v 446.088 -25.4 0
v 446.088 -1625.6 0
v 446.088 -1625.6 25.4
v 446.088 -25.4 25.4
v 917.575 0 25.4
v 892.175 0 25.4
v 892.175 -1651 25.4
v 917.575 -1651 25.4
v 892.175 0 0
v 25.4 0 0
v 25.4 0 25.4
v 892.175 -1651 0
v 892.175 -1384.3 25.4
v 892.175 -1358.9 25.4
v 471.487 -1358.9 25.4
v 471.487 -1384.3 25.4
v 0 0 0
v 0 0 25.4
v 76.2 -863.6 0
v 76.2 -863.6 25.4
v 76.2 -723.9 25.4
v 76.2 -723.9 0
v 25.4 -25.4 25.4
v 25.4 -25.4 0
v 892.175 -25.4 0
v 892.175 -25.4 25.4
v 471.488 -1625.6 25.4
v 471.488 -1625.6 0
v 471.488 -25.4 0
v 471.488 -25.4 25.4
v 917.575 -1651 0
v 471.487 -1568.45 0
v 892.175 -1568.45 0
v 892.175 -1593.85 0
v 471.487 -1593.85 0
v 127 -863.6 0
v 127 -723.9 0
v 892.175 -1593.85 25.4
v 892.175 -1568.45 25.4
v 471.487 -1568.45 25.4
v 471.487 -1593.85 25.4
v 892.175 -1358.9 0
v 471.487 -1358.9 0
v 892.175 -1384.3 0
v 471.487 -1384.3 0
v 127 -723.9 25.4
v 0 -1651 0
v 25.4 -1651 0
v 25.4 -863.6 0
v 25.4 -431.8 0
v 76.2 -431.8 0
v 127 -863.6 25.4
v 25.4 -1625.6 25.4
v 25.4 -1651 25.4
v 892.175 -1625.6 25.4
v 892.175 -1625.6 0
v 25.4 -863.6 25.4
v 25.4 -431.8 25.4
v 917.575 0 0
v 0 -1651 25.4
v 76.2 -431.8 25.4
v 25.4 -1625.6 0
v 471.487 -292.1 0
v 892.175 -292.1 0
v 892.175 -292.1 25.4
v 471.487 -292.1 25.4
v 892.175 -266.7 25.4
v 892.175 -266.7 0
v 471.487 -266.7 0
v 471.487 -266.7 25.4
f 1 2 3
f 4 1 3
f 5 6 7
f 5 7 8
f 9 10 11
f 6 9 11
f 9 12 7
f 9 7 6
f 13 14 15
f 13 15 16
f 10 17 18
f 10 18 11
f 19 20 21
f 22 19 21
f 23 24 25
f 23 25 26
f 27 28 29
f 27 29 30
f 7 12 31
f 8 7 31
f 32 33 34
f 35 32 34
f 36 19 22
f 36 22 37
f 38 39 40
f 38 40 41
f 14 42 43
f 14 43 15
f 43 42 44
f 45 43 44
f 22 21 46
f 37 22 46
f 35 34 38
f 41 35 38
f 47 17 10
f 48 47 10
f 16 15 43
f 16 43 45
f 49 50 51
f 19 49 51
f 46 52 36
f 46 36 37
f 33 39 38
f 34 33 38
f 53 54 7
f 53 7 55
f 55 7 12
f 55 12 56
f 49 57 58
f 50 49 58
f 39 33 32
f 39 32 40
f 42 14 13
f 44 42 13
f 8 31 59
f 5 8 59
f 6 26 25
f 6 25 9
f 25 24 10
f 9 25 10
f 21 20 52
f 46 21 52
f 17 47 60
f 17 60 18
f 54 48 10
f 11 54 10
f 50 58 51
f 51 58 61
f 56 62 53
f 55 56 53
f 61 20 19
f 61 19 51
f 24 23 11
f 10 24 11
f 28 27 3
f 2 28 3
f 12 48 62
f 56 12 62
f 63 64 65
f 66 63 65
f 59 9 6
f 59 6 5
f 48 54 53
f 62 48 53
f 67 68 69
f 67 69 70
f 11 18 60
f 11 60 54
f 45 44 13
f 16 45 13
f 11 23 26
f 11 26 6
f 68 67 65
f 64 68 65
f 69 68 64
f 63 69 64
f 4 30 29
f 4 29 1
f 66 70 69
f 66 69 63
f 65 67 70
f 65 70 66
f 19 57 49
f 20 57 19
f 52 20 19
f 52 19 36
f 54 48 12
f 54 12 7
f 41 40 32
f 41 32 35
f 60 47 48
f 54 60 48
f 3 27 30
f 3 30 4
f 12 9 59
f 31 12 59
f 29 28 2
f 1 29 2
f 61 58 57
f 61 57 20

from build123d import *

# Parameters (mm, degrees)
F0_W      = 25.4
F0_H      = 1651
F1_DEPTH  = 25.4
F2_W      = 25.4
F2_H      = 25.4
F3_DEPTH  = 866.775
F4_W      = 25.4
F4_H      = 25.4
F5_DEPTH  = 1600.2
F6_W      = 25.4
F6_H      = 25.4
F7_DEPTH  = 420.6875
F8_W      = 50.8
F8_H      = 431.8
F9_DEPTH  = 25.4
F10_W     = 50.8
F10_H     = 139.7
F11_DEPTH = 25.4


with BuildPart() as f1:
    # F0 (on Top) → F1 (new body)
    with BuildSketch(Plane.XY):
        with Locations((12.7, -825.5)):
            Rectangle(F0_W, F0_H)
        with Locations((904.875, -825.5)):
            Rectangle(F0_W, F0_H)
    extrude(amount=F1_DEPTH)


with BuildPart() as f3:
    # F2 (on face) → F3 (new body, through all)
    with BuildSketch(Plane.YZ.offset(25.4)):
        with Locations((-12.7, 12.7)):
            Rectangle(F2_W, F2_H)
        with Locations((-1638.3, 12.7)):
            Rectangle(F2_W, F2_H)
    extrude(amount=F3_DEPTH)


with BuildPart() as f5:
    # F4 (on face) → F5 (new body, through all)
    with BuildSketch(Plane(origin=(0, -1625.6, 0), x_dir=(-1, 0, 0), z_dir=(0, 1, 0))):
        with Locations((-458.7875, 12.7)):
            Rectangle(F4_W, F4_H)
    extrude(amount=F5_DEPTH)


with BuildPart() as f7:
    # F6 (on face) → F7 (new body, through all)
    with BuildSketch(Plane(origin=(892.175, 0, 0), x_dir=(0, -1, 0), z_dir=(-1, 0, 0))):
        with Locations((279.4, 12.7)):
            Rectangle(F6_W, F6_H)
        with Locations((1581.15, 12.7)):
            Rectangle(F6_W, F6_H)
        with Locations((1371.6, 12.7)):
            Rectangle(F6_W, F6_H)
    extrude(amount=F7_DEPTH)


with BuildPart() as f9:
    # F8 (on face) → F9 (new body)
    with BuildSketch(Plane.XY.offset(25.4)):
        with Locations((50.8, -647.7)):
            Rectangle(F8_W, F8_H)
    extrude(amount=-F9_DEPTH)


with BuildPart() as f11:
    # F10 (on face) → F11 (new body)
    with BuildSketch(Plane.XY.offset(25.4)):
        with Locations((101.6, -793.75)):
            Rectangle(F10_W, F10_H)
    extrude(amount=-F11_DEPTH)


solid = Compound([f1.part, f3.part, f5.part, f7.part, f9.part, f11.part])
